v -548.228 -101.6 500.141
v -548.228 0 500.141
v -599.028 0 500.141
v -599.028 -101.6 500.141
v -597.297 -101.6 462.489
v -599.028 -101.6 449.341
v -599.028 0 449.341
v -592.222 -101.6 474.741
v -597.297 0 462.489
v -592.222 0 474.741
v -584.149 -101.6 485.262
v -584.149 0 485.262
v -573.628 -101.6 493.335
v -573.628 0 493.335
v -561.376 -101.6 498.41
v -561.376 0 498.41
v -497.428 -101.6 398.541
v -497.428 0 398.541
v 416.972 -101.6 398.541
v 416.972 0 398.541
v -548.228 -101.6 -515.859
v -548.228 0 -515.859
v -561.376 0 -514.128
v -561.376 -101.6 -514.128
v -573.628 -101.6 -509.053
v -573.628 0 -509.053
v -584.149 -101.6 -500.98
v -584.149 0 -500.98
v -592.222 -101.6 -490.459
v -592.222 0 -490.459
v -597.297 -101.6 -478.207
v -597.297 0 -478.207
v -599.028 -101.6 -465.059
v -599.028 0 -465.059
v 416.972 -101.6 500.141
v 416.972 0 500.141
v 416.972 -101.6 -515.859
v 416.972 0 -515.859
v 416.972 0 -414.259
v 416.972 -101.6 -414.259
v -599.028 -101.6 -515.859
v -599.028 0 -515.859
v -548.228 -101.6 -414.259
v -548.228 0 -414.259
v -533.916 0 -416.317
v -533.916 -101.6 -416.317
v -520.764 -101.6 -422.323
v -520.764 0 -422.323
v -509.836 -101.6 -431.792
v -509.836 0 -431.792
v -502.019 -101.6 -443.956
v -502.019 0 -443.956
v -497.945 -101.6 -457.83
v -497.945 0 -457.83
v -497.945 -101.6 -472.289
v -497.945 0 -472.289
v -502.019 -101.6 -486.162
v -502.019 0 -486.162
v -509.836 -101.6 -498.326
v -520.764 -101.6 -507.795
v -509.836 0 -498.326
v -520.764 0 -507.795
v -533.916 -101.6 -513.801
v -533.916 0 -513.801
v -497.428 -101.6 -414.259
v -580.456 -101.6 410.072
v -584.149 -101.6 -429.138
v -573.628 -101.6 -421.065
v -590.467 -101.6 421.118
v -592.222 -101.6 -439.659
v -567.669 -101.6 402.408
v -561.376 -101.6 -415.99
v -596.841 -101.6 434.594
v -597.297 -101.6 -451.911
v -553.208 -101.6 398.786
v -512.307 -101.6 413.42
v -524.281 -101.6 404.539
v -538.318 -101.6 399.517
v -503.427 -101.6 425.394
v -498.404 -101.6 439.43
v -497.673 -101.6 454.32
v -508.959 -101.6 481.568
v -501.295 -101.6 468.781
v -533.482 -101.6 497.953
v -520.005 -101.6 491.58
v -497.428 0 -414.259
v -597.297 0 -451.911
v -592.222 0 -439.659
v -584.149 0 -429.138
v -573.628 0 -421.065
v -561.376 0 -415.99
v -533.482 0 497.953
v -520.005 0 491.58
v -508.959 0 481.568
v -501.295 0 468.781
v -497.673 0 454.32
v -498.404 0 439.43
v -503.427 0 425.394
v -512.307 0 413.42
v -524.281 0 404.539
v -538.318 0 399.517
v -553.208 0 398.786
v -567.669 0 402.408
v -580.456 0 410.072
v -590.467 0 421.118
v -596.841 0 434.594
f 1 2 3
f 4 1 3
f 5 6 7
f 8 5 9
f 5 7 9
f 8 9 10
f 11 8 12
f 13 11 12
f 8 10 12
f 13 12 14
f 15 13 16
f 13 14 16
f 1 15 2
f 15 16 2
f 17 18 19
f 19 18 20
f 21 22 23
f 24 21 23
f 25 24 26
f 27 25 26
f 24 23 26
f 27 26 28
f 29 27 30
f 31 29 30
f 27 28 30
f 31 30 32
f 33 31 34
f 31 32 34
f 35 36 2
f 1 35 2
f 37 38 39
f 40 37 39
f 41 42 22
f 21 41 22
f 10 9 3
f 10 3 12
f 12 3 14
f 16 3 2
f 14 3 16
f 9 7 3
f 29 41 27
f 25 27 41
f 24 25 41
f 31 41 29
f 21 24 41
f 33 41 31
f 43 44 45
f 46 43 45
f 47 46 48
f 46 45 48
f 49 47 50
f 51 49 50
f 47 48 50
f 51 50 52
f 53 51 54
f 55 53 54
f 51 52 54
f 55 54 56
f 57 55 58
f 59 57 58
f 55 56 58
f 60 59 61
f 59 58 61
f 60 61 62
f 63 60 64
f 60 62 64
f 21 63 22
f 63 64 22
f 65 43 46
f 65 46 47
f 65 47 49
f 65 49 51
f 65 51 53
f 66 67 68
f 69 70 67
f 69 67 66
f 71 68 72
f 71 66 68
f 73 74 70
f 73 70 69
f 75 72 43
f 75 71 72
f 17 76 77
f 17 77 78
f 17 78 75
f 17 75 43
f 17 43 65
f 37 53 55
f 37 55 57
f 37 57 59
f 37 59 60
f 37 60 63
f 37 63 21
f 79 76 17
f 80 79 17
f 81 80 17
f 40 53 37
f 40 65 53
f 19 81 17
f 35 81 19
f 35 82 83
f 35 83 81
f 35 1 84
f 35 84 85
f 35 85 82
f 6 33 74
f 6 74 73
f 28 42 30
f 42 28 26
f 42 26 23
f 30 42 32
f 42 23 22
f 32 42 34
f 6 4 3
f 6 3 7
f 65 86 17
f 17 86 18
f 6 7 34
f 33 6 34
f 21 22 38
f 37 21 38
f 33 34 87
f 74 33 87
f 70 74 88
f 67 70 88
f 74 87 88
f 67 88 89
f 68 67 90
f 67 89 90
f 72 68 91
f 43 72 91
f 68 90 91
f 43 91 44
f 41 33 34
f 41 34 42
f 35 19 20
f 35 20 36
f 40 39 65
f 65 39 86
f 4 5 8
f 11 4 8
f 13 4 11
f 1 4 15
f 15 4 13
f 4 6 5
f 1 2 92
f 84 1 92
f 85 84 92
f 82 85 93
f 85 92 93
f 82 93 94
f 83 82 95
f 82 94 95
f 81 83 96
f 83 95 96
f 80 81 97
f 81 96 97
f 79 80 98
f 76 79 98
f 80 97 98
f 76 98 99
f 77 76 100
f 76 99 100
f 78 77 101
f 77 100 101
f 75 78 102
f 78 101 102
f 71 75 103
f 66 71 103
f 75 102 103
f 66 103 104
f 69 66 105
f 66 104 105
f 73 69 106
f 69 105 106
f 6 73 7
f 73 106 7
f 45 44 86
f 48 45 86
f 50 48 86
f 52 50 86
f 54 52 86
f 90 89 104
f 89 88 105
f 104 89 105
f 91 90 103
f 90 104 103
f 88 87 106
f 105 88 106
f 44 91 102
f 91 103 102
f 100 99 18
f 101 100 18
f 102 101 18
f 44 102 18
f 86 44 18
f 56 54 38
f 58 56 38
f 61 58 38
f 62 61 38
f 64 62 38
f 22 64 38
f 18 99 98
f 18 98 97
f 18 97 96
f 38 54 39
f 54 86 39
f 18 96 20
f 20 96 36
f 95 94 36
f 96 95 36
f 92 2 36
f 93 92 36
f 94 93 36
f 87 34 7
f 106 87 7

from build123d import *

# Parameters (mm, degrees)
F1_DEPTH = 101.6


with BuildPart() as f1:
    # F0 (on Front) → F1 (new body)
    with BuildSketch(Plane.XZ):
        with BuildLine():
            Line((416.9716343101, 500.1409003437), (-548.2283656899, 500.1409003437))
            ThreePointArc((-548.2283656899, 500.1409003437), (-512.3073412056, 485.2619248279), (-497.4283656899, 449.3409003437))
            ThreePointArc((-497.4283656899, 449.3409003437), (-512.3073412056, 413.4198758594), (-548.2283656899, 398.5409003437))
            Line((-548.2283656899, 398.5409003437), (-497.4283656899, 398.5409003437))
            Line((-497.4283656899, 398.5409003437), (416.9716343101, 398.5409003437))
            Line((416.9716343101, 398.5409003437), (416.9716343101, 500.1409003437))
        make_face()
        with BuildLine():
            ThreePointArc((-548.2283656899, 398.5409003437), (-584.1493901742, 413.4198758594), (-599.0283656899, 449.3409003437))
            Line((-599.0283656899, 449.3409003437), (-599.0283656899, 398.5409003437))
            Line((-599.0283656899, 398.5409003437), (-548.2283656899, 398.5409003437))
        make_face()
        Polygon((-548.2283656899, 398.5409003437), (-599.0283656899, 398.5409003437), (-599.0283656899, -414.2590996563), (-548.2283656899, -414.2590996563), (-497.4283656899, -414.2590996563), (-497.4283656899, 398.5409003437), align=None)
        with BuildLine():
            Line((-497.4283656899, -414.2590996563), (-548.2283656899, -414.2590996563))
            ThreePointArc((-548.2283656899, -414.2590996563), (-512.3073412056, -429.1380751721), (-497.4283656899, -465.0590996563))
            ThreePointArc((-497.4283656899, -465.0590996563), (-512.3073412056, -500.9801241406), (-548.2283656899, -515.8590996563))
            Line((-548.2283656899, -515.8590996563), (416.9716343101, -515.8590996563))
            Line((416.9716343101, -515.8590996563), (416.9716343101, -414.2590996563))
            Line((416.9716343101, -414.2590996563), (-497.4283656899, -414.2590996563))
        make_face()
        with BuildLine():
            Line((-548.2283656899, -414.2590996563), (-599.0283656899, -414.2590996563))
            Line((-599.0283656899, -414.2590996563), (-599.0283656899, -465.0590996563))
            ThreePointArc((-599.0283656899, -465.0590996563), (-584.1493901742, -429.1380751721), (-548.2283656899, -414.2590996563))
        make_face()
    extrude(amount=F1_DEPTH)


with BuildPart() as f1b:
    # F0 (on Front) → F1, piece 2 (new body)
    with BuildSketch(Plane.XZ):
        with BuildLine():
            Line((-548.2283656899, 500.1409003437), (-599.0283656899, 500.1409003437))
            Line((-599.0283656899, 500.1409003437), (-599.0283656899, 449.3409003437))
            ThreePointArc((-599.0283656899, 449.3409003437), (-584.1493901742, 485.2619248279), (-548.2283656899, 500.1409003437))
        make_face()
    extrude(amount=F1_DEPTH)


with BuildPart() as f1c:
    # F0 (on Front) → F1, piece 3 (new body)
    with BuildSketch(Plane.XZ):
        with BuildLine():
            ThreePointArc((-548.2283656899, -515.8590996563), (-584.1493901742, -500.9801241406), (-599.0283656899, -465.0590996563))
            Line((-599.0283656899, -465.0590996563), (-599.0283656899, -515.8590996563))
            Line((-599.0283656899, -515.8590996563), (-548.2283656899, -515.8590996563))
        make_face()
    extrude(amount=F1_DEPTH)


solid = Compound([f1.part, f1b.part, f1c.part])
